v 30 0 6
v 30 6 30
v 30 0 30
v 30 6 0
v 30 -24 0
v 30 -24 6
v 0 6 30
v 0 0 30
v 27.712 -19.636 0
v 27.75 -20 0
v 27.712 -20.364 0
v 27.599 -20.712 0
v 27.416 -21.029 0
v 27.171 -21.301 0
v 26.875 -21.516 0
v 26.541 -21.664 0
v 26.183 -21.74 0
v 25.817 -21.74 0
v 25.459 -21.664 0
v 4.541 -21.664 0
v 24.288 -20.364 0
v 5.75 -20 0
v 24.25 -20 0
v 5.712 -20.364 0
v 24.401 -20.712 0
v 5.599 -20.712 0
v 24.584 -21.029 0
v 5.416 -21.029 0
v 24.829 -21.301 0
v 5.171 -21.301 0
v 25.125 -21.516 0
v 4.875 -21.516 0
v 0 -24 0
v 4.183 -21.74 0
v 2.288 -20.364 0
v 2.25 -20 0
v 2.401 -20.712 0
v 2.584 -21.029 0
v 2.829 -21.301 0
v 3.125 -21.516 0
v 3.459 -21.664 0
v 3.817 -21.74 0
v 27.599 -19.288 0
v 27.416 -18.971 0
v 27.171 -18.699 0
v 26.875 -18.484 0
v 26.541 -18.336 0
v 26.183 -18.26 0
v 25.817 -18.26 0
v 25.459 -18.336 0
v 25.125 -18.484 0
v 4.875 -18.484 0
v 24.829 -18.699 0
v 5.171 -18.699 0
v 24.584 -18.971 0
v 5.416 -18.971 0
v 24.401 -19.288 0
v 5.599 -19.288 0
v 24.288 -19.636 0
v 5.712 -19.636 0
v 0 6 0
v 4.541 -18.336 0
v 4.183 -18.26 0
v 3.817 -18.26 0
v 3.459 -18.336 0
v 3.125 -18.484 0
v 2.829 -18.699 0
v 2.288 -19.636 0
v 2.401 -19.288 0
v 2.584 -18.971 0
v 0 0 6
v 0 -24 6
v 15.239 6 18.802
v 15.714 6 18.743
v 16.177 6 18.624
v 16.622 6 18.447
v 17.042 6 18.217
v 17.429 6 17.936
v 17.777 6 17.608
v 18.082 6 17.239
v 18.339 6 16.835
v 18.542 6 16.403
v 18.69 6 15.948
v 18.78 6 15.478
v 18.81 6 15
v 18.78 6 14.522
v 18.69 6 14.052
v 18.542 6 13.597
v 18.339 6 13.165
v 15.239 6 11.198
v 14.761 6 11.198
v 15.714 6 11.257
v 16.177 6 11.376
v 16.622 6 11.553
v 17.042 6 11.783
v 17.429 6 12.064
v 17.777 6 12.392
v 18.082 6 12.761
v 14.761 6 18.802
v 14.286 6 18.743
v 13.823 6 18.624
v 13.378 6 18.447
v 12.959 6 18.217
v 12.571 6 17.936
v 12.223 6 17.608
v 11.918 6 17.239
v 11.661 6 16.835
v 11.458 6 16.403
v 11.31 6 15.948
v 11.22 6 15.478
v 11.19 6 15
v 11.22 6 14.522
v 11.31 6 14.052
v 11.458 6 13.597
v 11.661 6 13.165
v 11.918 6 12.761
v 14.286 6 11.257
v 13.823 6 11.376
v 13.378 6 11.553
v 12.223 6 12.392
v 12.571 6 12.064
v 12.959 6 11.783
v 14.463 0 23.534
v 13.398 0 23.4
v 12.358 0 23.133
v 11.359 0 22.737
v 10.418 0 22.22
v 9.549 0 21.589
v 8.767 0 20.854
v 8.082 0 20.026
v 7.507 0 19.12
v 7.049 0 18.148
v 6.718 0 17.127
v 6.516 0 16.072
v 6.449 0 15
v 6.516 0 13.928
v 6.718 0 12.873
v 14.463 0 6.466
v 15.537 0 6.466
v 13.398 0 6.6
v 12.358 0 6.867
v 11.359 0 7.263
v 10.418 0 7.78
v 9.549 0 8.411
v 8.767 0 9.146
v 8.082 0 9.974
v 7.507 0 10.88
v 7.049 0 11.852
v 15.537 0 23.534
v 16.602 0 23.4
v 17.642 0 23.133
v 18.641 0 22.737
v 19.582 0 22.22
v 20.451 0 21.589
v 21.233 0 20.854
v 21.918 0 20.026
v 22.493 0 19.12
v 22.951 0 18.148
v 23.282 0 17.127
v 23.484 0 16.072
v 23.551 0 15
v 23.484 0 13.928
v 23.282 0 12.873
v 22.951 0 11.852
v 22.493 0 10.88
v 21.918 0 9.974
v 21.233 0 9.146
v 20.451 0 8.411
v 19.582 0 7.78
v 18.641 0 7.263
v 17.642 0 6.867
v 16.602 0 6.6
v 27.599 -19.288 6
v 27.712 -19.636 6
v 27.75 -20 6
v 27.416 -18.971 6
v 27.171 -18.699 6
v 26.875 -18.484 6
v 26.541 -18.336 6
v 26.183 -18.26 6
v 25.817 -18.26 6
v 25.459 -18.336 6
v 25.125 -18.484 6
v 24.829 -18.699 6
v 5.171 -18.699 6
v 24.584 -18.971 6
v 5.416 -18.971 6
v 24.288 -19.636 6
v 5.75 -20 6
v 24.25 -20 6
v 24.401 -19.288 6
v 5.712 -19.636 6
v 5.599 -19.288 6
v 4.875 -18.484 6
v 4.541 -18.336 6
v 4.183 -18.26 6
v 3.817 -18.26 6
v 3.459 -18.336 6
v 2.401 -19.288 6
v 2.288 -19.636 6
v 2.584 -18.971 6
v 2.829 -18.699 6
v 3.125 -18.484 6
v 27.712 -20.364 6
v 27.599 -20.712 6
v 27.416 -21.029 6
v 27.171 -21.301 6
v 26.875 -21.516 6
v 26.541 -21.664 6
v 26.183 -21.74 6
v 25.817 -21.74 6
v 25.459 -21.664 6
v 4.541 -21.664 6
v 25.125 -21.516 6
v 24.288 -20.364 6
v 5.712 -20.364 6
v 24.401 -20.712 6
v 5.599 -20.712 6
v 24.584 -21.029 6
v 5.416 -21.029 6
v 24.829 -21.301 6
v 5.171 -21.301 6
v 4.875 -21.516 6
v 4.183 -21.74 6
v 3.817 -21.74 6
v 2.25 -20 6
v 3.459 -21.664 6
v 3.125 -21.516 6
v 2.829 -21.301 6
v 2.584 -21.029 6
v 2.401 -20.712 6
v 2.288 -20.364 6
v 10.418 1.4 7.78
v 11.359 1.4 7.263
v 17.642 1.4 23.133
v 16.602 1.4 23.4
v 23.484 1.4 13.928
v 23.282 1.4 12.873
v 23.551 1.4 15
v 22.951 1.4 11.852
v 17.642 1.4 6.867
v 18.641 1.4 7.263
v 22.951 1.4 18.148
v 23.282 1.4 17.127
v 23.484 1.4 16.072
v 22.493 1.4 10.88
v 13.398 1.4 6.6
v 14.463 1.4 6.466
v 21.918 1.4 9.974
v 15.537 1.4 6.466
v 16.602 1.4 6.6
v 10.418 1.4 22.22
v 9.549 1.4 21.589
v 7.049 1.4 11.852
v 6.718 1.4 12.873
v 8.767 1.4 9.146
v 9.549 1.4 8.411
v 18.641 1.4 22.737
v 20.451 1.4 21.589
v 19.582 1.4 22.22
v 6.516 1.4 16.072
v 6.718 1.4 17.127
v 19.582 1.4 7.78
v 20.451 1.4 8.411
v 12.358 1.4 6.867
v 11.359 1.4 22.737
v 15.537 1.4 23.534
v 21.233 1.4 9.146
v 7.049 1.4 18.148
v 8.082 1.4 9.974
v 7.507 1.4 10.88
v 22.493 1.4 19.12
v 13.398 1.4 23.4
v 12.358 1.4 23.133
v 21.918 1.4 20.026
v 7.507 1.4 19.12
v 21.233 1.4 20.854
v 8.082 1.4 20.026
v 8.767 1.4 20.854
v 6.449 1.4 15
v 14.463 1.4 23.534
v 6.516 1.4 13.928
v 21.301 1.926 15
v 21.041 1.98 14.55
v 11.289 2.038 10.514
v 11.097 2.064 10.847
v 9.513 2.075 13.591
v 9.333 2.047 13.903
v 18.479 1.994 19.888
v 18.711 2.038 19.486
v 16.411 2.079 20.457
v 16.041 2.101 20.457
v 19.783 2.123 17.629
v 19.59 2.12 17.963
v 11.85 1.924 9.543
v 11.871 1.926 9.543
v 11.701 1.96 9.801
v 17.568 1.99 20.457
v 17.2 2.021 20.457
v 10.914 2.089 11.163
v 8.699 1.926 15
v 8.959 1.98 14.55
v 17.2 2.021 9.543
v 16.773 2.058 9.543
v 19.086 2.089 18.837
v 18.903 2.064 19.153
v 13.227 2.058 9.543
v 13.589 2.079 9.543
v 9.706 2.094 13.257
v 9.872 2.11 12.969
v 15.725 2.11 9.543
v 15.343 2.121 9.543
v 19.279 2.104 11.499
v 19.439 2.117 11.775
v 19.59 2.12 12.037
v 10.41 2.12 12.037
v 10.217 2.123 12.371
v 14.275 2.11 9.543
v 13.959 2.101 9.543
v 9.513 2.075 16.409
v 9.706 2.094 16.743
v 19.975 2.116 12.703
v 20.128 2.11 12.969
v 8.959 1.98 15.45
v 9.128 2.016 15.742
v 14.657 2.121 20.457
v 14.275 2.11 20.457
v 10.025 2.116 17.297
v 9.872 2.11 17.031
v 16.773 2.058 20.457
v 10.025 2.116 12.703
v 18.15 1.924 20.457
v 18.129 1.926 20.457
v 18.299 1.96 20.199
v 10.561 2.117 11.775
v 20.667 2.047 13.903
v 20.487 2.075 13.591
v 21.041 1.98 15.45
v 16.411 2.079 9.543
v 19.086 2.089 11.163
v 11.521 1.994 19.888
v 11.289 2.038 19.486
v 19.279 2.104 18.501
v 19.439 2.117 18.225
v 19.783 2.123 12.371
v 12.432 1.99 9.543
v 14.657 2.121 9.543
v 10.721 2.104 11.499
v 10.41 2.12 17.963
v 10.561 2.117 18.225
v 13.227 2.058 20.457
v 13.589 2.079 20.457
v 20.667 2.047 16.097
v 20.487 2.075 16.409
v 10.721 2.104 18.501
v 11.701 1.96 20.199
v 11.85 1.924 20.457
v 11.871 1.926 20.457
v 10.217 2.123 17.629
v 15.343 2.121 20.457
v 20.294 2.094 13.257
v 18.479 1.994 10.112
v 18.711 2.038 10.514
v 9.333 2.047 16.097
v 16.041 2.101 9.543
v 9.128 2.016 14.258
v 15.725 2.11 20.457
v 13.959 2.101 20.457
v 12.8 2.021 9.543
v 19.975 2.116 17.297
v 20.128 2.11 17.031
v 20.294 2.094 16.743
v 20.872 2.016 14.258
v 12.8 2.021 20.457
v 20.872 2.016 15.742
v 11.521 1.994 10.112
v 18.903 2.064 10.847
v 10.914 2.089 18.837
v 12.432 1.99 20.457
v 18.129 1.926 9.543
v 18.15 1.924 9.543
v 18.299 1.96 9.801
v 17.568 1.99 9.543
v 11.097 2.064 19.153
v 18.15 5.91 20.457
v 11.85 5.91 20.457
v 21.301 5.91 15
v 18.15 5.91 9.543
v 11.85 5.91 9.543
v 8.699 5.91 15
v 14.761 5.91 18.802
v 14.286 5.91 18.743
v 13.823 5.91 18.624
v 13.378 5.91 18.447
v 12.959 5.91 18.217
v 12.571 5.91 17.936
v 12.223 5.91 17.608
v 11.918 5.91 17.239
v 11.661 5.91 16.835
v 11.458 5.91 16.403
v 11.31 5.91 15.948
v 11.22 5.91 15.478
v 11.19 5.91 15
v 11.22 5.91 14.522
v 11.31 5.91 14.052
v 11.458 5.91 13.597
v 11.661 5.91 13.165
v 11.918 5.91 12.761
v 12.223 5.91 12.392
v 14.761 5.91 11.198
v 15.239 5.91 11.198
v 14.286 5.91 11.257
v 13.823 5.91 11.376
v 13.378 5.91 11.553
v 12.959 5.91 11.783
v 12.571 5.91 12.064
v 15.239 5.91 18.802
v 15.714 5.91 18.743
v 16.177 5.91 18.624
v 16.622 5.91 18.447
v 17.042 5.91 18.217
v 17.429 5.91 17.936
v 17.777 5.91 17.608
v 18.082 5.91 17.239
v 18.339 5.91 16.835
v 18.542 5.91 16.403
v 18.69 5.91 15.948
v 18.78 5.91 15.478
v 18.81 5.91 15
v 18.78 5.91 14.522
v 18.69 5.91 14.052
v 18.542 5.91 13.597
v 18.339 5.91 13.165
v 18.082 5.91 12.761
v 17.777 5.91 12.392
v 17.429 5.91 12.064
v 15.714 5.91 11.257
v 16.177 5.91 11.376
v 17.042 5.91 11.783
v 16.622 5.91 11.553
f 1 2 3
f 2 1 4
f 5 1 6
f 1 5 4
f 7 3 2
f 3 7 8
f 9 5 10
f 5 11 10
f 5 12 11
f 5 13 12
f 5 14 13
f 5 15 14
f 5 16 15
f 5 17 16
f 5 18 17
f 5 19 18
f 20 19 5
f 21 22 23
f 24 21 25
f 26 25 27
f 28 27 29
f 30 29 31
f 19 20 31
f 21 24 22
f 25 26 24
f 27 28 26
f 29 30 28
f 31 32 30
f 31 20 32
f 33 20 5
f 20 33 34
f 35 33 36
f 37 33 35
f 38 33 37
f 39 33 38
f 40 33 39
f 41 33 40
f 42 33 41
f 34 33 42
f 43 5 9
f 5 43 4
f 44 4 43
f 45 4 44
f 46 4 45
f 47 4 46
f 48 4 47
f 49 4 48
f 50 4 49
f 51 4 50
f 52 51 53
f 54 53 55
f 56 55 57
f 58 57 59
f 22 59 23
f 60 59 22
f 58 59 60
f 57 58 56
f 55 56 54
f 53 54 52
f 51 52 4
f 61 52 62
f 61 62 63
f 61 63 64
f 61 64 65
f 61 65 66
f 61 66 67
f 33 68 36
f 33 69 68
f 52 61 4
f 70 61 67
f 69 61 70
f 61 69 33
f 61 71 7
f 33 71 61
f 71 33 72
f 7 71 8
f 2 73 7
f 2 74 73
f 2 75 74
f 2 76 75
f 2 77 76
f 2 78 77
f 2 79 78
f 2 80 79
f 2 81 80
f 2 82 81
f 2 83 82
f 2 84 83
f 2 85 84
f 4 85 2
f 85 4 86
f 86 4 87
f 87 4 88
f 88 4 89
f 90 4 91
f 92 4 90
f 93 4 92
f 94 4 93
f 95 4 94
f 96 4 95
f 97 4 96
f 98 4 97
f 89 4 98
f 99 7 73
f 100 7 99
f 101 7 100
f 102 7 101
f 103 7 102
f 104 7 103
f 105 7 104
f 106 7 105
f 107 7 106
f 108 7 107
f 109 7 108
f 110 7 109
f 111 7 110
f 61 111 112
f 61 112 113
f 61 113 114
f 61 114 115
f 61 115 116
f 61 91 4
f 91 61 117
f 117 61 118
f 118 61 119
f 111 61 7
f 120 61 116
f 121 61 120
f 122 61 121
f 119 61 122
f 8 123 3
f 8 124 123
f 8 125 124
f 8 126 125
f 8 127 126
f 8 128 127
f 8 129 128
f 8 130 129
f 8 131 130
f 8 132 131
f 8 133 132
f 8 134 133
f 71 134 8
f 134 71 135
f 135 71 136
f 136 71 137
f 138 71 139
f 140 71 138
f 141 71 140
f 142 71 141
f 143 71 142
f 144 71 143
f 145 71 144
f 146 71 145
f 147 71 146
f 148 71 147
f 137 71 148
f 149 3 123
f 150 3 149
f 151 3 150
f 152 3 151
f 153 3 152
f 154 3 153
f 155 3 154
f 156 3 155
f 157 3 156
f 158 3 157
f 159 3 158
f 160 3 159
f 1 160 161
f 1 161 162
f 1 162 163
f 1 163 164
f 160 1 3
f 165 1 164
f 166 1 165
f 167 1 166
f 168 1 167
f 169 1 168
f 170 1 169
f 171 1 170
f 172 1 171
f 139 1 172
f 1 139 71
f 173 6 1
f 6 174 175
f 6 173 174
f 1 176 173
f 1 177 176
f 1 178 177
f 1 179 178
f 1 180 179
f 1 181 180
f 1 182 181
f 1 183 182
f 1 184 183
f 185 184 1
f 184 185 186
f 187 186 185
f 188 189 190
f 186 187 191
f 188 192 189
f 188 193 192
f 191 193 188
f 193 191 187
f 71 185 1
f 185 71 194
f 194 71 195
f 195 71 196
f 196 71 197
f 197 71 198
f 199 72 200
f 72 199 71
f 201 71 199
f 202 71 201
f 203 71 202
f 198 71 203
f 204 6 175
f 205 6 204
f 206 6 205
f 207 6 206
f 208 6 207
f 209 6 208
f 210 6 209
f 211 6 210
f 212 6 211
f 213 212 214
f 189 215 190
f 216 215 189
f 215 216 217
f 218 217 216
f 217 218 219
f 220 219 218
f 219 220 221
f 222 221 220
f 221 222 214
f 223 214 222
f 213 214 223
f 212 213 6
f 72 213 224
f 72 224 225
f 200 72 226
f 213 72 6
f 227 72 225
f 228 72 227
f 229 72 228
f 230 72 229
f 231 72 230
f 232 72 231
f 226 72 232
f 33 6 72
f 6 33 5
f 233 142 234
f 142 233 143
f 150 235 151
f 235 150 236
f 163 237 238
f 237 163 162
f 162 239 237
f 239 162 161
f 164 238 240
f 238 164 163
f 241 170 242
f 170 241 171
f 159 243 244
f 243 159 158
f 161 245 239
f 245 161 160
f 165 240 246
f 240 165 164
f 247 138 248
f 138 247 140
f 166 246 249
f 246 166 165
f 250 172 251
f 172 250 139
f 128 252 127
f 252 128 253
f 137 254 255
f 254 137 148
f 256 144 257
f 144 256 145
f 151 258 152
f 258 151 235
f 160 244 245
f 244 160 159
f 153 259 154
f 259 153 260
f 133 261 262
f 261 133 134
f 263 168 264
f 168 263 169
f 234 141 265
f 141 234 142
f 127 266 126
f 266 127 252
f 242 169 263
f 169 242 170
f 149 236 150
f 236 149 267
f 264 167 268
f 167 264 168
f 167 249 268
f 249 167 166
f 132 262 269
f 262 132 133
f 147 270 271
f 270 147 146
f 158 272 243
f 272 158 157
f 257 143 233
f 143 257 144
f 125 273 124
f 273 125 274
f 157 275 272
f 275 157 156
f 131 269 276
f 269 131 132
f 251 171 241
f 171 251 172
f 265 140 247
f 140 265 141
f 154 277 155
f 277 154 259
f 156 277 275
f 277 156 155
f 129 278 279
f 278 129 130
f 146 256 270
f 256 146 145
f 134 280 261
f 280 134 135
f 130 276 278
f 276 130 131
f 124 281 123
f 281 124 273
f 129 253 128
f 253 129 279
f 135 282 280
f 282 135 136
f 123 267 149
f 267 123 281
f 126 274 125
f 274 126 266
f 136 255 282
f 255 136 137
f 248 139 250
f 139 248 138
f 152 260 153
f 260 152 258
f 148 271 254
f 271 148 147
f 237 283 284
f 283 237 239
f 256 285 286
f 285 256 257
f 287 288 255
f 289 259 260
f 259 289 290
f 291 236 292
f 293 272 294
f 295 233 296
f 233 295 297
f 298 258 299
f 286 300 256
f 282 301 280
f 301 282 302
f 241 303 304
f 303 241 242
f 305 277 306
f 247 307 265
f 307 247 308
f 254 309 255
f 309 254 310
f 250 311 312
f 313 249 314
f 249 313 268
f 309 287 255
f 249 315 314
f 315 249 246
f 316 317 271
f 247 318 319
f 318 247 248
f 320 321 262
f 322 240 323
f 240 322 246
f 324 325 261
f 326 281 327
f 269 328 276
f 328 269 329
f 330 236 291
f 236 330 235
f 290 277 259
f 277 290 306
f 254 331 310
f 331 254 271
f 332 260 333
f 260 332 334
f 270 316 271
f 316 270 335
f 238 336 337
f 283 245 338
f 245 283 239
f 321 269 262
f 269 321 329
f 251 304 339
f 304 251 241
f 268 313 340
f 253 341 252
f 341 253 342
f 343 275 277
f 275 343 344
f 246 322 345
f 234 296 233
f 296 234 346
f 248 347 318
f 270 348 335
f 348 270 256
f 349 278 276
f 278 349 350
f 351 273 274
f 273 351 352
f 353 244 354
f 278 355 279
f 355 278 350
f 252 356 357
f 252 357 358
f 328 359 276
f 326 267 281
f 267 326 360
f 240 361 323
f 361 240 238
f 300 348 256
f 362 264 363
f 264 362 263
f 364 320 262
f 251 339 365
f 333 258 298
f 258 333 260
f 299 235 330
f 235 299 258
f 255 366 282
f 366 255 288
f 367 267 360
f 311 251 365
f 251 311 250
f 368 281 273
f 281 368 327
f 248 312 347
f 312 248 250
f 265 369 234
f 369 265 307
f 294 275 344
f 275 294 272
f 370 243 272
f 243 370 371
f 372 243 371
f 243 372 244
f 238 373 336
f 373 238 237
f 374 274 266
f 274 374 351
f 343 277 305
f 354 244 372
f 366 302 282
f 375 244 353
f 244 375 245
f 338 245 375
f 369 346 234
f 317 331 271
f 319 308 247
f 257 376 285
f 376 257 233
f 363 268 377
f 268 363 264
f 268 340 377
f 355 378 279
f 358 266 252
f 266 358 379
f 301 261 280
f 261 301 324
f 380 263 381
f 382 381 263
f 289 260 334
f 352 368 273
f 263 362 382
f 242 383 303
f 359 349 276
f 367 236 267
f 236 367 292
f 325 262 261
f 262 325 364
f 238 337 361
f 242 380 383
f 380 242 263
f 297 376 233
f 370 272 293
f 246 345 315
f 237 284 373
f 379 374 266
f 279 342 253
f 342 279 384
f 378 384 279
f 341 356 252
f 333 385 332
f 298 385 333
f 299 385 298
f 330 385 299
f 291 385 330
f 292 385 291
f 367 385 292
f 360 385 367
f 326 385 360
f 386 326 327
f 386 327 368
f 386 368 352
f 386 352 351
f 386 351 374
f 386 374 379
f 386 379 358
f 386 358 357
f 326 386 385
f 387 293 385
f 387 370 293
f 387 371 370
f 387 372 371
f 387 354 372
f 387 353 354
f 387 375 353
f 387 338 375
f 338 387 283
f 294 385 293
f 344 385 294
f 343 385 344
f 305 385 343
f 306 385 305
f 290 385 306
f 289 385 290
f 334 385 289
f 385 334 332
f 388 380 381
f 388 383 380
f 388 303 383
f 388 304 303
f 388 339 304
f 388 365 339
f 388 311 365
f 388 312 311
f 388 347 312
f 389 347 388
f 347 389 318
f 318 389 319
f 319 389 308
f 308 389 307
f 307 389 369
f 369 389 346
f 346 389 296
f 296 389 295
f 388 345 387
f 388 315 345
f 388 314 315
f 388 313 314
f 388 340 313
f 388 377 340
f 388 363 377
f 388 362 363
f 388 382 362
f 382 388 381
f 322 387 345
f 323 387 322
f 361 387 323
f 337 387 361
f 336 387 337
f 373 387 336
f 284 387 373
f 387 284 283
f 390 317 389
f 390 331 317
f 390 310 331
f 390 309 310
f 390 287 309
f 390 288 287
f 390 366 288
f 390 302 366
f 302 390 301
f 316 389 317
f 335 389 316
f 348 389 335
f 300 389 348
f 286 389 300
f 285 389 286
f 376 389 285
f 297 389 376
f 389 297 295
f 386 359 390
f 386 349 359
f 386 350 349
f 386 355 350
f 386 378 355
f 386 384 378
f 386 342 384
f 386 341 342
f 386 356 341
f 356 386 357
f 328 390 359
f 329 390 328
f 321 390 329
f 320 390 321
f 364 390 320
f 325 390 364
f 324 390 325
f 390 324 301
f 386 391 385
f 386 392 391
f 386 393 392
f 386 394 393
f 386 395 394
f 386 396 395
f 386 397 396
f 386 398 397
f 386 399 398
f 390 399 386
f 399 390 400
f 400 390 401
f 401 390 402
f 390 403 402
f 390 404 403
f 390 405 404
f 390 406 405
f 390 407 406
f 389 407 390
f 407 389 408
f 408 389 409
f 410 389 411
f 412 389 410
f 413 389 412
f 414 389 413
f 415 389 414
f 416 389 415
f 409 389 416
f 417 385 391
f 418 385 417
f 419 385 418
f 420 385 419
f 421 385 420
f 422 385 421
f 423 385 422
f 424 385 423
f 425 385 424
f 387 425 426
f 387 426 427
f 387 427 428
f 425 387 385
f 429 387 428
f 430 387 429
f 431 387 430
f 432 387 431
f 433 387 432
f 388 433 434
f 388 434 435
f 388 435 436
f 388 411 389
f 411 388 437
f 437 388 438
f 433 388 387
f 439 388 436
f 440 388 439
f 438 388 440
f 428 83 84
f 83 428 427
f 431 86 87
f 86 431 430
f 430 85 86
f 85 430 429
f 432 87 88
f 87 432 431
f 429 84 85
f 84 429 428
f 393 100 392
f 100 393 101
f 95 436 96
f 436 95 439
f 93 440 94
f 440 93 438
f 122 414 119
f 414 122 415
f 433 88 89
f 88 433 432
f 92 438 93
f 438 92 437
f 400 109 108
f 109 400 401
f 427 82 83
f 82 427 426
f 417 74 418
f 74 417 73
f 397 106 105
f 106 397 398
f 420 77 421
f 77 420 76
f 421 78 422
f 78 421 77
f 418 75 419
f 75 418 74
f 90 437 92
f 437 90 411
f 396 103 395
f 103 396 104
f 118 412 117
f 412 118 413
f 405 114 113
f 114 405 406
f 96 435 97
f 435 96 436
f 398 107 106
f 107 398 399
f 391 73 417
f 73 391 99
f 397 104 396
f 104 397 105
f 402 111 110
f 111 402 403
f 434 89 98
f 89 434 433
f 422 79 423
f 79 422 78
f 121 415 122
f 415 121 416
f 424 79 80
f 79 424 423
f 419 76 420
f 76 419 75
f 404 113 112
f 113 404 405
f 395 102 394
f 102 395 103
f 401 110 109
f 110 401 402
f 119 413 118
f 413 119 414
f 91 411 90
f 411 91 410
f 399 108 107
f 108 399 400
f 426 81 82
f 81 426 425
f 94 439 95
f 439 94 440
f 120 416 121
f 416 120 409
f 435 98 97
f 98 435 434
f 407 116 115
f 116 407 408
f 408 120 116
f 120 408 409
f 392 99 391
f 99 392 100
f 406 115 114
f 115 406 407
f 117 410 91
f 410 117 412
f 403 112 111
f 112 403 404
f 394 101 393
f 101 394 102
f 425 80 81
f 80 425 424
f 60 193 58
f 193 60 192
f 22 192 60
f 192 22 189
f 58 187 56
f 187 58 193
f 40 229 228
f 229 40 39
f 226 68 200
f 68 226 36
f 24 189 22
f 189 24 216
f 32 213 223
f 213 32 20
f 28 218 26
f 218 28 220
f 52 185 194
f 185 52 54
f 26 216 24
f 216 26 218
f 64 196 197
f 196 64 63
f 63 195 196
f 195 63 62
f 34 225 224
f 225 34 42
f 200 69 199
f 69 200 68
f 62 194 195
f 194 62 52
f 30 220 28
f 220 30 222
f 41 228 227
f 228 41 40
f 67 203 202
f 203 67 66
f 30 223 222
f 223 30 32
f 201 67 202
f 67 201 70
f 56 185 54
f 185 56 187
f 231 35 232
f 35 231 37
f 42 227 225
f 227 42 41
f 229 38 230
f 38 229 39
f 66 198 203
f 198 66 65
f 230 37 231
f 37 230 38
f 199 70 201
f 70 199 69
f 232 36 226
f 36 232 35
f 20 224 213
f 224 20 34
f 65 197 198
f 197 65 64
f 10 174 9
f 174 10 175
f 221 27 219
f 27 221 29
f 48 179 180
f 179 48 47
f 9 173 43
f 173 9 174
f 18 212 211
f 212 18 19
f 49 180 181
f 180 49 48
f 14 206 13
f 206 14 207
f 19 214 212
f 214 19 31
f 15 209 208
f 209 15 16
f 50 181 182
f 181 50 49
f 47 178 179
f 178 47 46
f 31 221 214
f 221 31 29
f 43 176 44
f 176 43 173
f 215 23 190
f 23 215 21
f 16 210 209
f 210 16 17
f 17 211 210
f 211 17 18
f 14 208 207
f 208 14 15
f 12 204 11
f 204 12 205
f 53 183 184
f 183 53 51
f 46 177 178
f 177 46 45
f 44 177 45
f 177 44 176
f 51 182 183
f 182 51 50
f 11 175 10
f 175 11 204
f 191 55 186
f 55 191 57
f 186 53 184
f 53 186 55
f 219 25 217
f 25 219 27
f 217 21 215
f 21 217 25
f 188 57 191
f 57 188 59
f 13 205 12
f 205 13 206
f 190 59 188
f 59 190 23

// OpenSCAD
UP = 20;
inch = 25.4;
module flange_nut(d, D, h, H, UP){
  translate([0, 0, UP]){
    translate([0, 0, -.01])cylinder(h=h + .01, d=D, $fn=50);//flange
    translate([0, 0, h])cylinder(h=1, d1=D, d2=D/2, $fn=50);//flange
    cylinder(h=H+.01, d=d, $fn=6);//nut
  }
  cylinder(d=D, h=UP, $fn=50);
}

difference(){
  union(){
    cube([30, 6, 30]);
    translate([0, -24, 0])cube([30, 30, 6]);
  }
  translate([15,-20.1,15])rotate([-90, 0, 0])
    union(){
    scale([1.08, 1.08, 1])
      flange_nut(d=7 * inch/16.*1.05, D=19*inch/32*1.05, h=1.5, H=6, UP=UP);
    cylinder(d=.3*inch, h=100, $fn=50);
  }
translate([15-11, -20, -1])
rotate([0, 0, 0])cylinder(d=3.5, h=50, $fn=30);
translate([15-11+22, -20, -1])
rotate([0, 0, 0])cylinder(d=3.5, h=50, $fn=30);
}
